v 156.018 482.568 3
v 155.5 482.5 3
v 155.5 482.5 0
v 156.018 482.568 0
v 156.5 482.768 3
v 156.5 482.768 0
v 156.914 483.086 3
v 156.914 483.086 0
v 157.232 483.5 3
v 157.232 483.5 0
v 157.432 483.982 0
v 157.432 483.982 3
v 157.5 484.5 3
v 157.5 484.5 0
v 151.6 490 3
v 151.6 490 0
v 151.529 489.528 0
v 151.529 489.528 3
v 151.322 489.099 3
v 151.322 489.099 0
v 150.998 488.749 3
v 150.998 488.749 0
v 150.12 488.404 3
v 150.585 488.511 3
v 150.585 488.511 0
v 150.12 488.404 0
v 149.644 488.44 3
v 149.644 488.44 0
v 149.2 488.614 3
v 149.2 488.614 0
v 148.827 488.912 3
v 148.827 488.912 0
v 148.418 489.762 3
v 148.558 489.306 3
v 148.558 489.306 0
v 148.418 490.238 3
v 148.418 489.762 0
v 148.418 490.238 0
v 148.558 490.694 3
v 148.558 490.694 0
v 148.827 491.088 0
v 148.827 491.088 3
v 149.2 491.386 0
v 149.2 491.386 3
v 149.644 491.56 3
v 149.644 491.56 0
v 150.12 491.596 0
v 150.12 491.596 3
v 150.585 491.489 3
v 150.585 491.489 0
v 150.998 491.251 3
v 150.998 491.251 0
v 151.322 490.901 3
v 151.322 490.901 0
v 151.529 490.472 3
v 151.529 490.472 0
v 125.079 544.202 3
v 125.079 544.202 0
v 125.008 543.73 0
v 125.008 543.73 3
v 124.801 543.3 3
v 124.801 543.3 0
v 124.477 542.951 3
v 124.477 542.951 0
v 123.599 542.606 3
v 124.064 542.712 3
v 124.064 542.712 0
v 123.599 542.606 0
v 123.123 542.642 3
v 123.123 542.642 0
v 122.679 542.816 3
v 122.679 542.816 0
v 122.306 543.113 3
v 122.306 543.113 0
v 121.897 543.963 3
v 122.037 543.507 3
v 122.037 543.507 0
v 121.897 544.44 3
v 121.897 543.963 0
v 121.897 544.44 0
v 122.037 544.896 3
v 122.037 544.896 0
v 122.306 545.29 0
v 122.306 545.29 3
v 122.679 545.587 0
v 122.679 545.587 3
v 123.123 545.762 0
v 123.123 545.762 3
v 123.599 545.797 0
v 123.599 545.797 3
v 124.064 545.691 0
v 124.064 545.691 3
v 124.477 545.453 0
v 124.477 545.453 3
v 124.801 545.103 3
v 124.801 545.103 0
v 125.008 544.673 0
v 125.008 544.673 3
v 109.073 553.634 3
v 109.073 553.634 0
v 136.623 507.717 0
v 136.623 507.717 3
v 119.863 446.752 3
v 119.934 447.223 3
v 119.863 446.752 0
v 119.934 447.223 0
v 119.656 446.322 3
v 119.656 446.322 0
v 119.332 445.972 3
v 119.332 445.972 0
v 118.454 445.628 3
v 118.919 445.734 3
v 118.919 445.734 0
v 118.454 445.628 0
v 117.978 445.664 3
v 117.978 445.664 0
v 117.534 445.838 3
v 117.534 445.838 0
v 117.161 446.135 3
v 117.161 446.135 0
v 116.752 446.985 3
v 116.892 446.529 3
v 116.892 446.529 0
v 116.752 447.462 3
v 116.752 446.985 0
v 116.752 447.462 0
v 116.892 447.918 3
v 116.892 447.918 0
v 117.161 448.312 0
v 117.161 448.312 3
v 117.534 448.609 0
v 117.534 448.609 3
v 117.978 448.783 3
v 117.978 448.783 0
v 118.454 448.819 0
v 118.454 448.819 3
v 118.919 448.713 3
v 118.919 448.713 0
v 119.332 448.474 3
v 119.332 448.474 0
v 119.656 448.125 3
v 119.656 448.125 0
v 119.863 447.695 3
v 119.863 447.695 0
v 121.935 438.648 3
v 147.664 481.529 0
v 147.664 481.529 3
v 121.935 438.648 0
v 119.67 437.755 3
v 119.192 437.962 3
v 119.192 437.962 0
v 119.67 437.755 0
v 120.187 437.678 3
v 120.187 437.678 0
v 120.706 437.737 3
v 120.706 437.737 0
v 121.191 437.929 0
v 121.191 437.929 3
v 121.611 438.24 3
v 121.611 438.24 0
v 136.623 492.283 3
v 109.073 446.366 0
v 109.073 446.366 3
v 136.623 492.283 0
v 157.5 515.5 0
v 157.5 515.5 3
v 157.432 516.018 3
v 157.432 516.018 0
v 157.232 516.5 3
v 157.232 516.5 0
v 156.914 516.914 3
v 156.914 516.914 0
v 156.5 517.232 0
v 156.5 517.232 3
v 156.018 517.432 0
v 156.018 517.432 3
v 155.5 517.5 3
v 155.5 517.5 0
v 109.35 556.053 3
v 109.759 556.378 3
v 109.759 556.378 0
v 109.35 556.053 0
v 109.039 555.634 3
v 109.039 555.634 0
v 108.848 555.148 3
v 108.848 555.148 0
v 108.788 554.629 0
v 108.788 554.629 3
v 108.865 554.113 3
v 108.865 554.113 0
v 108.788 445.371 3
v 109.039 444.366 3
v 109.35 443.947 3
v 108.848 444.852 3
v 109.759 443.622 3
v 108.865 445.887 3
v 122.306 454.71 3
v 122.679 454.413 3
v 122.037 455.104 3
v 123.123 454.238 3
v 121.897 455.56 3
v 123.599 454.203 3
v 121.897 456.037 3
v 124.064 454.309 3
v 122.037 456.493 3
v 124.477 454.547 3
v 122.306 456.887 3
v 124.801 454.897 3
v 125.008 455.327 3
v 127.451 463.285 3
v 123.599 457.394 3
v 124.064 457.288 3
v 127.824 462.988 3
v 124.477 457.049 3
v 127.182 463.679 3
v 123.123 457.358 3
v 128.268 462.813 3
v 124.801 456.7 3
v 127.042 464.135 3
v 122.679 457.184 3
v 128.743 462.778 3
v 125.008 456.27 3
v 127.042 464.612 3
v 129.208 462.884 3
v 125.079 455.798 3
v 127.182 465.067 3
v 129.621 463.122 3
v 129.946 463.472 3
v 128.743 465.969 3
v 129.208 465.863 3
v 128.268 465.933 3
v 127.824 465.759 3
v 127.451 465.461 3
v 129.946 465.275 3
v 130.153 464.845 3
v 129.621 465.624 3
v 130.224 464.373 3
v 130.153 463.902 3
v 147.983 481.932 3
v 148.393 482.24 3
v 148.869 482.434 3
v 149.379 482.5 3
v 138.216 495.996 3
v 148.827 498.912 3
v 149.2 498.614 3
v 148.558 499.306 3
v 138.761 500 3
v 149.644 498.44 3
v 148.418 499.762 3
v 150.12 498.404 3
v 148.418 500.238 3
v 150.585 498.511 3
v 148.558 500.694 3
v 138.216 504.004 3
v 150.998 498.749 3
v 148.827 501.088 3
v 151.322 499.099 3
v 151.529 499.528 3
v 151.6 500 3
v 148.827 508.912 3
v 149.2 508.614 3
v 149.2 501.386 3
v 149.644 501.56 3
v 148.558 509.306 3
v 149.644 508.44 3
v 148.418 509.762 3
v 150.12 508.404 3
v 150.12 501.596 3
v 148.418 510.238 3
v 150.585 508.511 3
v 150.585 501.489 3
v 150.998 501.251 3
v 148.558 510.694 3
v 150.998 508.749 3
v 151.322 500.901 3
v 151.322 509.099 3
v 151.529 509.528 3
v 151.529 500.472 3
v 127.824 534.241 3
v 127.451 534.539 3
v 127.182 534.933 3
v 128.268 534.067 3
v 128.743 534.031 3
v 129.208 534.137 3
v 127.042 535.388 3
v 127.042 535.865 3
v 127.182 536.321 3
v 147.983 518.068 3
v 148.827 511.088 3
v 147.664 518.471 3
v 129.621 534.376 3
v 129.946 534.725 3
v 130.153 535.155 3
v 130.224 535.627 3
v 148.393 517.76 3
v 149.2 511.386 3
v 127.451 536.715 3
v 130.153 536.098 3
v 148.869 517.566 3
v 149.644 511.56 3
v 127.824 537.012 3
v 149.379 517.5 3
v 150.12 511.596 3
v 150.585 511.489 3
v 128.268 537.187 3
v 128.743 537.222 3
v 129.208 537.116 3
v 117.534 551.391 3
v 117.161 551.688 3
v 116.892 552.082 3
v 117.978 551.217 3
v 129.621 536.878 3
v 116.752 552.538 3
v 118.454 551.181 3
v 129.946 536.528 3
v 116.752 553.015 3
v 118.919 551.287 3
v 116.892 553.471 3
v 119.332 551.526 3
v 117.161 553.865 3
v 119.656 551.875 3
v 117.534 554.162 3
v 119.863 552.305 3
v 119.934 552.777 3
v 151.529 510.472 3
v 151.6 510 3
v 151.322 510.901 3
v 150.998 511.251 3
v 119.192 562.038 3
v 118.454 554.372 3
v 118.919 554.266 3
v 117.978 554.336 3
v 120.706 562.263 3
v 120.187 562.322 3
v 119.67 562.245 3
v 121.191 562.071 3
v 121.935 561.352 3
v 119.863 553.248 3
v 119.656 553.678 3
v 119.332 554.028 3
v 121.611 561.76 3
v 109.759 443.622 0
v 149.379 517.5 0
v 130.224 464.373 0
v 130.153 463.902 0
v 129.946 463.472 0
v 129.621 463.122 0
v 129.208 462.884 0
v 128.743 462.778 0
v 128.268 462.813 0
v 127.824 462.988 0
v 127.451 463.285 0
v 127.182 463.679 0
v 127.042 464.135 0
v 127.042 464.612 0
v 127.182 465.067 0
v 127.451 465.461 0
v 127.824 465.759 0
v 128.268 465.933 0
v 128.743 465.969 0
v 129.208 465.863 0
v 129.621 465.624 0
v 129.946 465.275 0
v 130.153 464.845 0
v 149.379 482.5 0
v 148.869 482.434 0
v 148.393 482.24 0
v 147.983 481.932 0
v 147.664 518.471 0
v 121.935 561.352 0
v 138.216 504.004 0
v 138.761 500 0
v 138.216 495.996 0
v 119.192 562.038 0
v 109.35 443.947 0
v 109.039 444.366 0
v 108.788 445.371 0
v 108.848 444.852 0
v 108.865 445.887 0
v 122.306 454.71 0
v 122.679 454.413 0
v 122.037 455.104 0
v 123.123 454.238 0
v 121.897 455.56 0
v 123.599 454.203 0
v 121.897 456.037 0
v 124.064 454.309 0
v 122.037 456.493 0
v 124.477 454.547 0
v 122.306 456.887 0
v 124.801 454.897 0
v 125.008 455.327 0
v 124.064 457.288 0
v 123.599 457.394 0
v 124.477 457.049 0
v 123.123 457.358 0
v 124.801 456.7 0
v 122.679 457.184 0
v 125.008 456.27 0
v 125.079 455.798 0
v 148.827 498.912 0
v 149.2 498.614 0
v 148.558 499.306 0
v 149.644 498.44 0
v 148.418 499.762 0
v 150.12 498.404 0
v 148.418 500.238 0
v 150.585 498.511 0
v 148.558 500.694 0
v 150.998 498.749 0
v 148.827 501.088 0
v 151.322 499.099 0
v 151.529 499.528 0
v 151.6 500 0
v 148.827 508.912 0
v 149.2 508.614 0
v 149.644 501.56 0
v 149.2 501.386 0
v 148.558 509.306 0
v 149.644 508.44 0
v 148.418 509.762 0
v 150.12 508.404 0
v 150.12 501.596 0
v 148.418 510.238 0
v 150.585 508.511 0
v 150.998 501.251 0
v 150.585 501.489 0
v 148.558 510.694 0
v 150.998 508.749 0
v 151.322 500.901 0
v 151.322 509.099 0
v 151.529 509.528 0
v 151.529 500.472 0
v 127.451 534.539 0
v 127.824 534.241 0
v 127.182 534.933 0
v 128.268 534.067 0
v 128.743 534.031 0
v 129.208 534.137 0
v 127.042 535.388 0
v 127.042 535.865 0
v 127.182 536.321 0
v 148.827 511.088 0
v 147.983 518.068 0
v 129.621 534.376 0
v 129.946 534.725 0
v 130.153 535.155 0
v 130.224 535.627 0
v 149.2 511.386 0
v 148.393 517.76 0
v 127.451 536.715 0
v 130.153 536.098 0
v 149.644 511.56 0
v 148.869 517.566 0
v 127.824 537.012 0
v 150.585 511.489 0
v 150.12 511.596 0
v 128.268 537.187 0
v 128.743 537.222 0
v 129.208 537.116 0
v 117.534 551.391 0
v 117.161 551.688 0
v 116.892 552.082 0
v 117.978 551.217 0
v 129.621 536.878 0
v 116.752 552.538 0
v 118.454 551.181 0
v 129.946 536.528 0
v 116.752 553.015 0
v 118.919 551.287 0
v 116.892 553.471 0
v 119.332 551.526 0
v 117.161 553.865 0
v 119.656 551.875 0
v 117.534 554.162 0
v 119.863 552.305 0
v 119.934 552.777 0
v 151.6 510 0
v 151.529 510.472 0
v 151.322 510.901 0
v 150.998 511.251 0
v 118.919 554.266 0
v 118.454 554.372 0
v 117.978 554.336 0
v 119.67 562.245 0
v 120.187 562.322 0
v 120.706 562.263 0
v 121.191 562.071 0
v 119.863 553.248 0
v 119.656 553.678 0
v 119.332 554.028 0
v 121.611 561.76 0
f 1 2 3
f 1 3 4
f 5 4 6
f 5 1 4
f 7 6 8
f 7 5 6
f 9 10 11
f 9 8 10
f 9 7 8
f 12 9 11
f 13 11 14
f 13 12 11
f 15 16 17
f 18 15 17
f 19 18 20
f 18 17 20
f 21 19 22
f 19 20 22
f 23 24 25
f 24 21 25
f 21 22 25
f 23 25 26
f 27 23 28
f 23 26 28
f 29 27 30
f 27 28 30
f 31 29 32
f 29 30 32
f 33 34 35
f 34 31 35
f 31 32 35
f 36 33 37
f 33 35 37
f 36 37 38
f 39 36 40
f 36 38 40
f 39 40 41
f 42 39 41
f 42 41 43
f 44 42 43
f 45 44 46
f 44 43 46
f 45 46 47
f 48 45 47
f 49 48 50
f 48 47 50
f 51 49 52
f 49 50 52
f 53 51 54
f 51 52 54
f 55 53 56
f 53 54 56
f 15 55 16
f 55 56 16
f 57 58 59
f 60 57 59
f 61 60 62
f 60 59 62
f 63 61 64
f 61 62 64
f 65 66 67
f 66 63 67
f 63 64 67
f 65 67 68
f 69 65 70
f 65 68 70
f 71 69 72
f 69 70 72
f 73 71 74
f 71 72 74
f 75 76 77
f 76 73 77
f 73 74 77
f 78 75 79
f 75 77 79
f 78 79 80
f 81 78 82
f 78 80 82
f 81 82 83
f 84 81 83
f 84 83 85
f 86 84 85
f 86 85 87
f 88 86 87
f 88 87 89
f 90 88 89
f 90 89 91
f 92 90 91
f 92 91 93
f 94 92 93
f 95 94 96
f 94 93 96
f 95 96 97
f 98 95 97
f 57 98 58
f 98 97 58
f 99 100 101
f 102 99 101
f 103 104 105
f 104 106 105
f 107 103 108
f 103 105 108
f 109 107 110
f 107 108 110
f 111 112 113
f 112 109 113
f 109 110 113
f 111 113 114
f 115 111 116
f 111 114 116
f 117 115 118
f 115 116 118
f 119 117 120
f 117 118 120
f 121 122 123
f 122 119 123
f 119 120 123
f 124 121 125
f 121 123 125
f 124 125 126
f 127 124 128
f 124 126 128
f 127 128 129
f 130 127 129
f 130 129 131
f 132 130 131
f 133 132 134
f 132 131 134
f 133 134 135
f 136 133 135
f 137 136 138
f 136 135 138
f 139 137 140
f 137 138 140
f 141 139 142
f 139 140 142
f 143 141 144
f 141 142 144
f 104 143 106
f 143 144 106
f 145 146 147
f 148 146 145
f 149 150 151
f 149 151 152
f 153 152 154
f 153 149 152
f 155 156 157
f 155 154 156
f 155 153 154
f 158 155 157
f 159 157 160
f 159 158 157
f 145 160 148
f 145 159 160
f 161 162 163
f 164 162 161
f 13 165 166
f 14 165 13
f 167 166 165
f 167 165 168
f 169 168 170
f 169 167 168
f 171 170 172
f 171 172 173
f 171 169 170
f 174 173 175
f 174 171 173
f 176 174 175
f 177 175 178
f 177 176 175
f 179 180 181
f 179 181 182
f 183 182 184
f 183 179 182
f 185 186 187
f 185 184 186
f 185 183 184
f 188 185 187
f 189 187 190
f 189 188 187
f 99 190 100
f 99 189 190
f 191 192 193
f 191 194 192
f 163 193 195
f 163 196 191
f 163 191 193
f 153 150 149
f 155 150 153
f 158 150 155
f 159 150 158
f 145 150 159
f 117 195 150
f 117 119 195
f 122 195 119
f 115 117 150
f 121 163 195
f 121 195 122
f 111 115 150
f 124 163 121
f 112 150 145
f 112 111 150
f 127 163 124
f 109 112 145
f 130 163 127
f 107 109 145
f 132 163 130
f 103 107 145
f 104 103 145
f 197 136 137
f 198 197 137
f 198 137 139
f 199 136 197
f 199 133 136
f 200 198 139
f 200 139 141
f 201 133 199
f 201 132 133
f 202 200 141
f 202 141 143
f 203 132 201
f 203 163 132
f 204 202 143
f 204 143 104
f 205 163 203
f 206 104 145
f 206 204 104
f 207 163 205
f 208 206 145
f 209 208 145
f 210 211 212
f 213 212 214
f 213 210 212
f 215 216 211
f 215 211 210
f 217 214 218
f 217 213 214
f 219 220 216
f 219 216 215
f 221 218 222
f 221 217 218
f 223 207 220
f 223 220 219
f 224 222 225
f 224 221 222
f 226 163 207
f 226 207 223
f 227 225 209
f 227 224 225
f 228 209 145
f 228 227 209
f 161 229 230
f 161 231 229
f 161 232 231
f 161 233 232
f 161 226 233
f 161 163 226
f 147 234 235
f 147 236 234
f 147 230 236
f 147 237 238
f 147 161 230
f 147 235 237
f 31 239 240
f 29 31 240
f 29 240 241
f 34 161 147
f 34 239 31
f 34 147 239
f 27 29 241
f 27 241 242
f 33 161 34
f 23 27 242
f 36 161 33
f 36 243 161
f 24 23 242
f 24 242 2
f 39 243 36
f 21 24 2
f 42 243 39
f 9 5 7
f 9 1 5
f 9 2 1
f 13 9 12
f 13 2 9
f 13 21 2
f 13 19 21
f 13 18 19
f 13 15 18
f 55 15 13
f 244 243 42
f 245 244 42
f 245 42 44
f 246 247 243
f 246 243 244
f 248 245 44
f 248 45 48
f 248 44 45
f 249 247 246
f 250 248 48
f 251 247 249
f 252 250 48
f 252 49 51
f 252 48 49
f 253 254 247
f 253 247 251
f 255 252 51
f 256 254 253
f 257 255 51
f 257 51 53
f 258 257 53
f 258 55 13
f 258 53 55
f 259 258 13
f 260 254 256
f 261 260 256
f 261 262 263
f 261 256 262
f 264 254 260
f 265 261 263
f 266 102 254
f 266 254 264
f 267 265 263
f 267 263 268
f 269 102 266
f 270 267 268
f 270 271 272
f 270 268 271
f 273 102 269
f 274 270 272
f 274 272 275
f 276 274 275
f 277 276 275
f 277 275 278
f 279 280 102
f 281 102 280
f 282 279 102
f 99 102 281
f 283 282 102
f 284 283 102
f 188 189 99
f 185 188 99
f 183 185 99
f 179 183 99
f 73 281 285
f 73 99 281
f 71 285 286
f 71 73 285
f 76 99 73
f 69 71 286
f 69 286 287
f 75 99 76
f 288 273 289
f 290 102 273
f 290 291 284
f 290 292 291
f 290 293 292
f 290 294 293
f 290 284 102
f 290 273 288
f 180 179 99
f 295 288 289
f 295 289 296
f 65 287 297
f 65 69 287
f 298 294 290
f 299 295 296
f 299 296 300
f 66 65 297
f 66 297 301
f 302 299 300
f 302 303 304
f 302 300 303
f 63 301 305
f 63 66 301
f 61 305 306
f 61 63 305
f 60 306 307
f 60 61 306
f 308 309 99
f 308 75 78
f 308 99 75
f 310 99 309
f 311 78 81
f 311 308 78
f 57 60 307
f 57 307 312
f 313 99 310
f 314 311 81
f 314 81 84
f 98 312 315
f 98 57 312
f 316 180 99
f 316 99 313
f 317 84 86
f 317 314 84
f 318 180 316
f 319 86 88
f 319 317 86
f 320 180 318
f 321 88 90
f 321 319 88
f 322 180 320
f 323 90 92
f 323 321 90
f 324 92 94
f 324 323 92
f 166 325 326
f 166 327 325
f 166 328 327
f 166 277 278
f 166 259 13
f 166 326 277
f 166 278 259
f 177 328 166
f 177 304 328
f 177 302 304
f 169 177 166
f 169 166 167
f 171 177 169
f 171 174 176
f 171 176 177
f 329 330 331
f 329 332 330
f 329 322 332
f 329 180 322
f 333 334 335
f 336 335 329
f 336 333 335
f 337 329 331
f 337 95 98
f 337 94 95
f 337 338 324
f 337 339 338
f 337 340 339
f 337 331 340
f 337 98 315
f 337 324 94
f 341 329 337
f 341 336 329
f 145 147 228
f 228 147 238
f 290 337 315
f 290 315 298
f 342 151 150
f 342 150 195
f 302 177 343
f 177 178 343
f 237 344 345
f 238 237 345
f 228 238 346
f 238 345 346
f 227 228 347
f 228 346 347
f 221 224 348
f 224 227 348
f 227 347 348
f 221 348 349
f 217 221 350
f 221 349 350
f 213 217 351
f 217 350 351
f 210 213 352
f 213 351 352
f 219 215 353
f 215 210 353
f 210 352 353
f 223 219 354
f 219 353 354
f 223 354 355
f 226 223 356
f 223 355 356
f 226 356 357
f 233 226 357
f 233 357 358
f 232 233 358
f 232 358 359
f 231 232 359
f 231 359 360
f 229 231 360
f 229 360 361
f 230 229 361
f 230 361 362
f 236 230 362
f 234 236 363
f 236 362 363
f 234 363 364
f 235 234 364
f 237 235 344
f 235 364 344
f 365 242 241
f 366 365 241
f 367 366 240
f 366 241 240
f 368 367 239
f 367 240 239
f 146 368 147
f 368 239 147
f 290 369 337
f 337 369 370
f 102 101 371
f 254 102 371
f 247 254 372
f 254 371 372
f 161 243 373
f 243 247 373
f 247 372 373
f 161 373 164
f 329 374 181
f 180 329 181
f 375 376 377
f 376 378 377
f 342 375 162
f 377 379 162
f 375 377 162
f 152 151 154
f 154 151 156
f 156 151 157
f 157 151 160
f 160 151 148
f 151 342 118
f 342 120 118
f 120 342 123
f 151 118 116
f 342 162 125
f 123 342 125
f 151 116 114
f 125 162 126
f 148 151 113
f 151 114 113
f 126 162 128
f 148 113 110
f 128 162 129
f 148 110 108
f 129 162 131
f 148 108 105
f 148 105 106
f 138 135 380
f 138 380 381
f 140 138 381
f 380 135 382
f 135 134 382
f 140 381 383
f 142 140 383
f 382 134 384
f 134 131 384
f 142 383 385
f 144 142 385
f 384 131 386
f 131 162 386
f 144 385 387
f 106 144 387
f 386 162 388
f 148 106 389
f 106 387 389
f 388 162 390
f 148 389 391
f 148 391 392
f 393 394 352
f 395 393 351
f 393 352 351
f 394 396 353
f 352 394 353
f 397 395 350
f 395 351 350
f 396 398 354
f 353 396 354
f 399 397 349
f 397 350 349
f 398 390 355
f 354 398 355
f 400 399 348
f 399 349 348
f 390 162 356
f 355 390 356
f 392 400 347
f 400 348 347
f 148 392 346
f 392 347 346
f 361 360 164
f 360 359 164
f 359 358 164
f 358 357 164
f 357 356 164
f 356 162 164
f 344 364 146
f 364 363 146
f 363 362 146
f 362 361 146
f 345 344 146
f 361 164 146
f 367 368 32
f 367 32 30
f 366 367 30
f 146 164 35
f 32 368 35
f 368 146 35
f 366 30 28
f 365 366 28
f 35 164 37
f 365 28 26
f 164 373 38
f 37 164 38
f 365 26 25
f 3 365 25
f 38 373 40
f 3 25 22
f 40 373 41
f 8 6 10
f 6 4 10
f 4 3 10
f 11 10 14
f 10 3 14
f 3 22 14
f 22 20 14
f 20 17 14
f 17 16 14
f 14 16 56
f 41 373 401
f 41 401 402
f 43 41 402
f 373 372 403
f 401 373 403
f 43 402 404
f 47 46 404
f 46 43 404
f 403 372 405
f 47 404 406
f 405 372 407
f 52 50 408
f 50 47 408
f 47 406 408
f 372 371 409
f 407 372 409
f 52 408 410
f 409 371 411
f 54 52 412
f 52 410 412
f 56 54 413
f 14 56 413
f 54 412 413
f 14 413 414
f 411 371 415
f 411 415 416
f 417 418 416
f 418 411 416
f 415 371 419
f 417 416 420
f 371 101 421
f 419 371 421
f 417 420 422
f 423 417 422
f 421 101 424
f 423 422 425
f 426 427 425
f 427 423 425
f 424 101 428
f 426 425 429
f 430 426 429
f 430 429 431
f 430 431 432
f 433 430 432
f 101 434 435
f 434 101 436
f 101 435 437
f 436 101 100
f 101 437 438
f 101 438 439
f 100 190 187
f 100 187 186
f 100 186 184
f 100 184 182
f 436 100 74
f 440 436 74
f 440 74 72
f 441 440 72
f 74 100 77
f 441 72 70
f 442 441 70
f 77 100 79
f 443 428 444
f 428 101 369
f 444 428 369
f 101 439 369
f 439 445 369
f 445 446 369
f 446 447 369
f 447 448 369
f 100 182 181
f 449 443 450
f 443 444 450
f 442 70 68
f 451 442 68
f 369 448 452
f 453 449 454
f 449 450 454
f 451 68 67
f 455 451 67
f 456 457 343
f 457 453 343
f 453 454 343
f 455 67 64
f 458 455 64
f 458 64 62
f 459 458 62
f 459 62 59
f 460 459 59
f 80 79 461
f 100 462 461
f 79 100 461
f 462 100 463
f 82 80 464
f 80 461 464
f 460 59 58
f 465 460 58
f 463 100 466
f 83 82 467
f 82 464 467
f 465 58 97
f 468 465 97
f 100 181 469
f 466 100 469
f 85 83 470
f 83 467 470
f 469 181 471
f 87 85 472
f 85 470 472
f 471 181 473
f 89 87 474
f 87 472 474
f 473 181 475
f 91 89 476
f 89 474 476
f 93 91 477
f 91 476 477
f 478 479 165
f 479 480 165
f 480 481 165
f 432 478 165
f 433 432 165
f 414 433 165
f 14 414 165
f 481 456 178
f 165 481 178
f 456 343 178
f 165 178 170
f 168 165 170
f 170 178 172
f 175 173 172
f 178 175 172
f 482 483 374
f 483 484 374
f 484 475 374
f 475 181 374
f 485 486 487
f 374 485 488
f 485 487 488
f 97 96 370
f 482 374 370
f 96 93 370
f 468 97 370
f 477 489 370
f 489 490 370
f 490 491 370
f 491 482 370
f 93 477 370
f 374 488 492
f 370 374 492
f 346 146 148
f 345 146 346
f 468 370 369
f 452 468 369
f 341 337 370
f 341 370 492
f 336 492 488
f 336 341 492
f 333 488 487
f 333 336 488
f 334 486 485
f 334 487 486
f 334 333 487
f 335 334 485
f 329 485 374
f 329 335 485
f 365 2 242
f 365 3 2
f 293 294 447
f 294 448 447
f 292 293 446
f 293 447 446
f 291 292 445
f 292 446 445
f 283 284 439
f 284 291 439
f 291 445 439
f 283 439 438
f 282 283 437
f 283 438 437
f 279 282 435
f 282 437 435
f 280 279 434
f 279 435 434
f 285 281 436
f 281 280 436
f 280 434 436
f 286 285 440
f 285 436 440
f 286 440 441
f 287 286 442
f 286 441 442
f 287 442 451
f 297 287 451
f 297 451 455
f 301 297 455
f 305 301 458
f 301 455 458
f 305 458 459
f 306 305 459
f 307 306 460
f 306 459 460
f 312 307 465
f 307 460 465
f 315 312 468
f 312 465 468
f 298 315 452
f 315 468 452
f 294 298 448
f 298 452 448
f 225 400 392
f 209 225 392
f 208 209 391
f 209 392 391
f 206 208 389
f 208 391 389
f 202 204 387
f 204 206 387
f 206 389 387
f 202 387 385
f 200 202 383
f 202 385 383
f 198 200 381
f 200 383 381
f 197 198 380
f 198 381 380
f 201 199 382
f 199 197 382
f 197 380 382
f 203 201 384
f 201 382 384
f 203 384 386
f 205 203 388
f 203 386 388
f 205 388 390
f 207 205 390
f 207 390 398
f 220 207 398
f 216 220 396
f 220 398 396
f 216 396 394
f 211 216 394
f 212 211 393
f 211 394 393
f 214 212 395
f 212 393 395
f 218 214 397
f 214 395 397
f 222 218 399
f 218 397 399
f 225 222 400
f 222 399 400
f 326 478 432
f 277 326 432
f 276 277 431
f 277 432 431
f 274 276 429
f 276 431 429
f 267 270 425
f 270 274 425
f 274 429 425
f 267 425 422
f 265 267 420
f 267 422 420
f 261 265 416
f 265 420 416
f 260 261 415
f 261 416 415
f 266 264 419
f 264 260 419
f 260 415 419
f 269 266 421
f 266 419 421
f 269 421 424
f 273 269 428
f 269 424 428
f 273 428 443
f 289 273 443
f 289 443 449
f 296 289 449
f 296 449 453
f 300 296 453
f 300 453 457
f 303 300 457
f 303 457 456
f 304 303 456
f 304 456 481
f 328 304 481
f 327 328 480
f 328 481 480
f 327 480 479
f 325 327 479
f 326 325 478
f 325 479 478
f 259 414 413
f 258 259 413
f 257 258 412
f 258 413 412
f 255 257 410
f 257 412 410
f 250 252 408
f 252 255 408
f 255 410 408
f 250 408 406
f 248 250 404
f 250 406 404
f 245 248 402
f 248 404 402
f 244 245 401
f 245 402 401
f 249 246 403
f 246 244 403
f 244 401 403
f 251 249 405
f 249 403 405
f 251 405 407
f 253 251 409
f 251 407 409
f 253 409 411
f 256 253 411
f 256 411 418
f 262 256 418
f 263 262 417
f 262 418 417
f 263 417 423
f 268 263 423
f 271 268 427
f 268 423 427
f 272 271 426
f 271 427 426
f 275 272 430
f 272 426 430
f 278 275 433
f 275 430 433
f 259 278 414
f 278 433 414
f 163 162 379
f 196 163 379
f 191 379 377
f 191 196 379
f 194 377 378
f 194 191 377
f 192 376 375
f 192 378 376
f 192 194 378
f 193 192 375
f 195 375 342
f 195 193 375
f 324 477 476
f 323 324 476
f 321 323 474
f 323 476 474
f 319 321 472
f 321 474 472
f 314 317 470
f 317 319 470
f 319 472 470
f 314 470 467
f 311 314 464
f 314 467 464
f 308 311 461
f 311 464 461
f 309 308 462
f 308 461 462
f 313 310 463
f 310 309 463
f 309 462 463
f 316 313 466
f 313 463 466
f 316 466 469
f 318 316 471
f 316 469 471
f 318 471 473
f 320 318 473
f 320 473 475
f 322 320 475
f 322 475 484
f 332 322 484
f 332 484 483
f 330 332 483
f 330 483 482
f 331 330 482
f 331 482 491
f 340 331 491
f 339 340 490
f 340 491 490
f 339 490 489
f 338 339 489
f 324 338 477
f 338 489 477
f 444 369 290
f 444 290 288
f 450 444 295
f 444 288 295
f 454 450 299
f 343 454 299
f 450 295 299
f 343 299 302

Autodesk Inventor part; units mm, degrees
ref_plane "YZ Plane" through (0, 0, 0) normal (1, 0, 0) x (0, 1, 0)
ref_plane "XZ Plane" through (0, 0, 0) normal (0, 1, 0) x (-1, 0, 0)
ref_plane "XY Plane" through (0, 0, 0) normal (0, 0, 1) x (1, 0, 0)
sketch "スケッチ1" plane through (0, 0, 0) normal (0, 0, 1) x (1, 0, 0)
  line L0 (-157.5, 1000) -> (-142.5, 1000)
  line L1 (-142.5, 1000) -> (-142.5, 0)
  line L2 (-142.5, 0) -> (-157.5, 0)
  line L3 (-157.5, 0) -> (-157.5, 1000)
  line L4 (142.5, 500) -> (157.5, 500) construction
  line L5 (157.5, 500) -> (157.5, 0) construction
  line L6 (157.5, 0) -> (142.5, 0)
  line L7 (142.5, 0) -> (142.5, 500) construction
  circle A0 centre (-150, 0) radius 1.6
  circle A1 centre (150, 500) radius 1.6
  line L8 (127.3377, 476.8069) -> (140.2001, 469.0894) construction
  line L9 (140.2001, 469.0894) -> (-127.3377, 23.1931) construction
  line L10 (-127.3377, 23.1931) -> (-140.2001, 30.9106)
  line L11 (-140.2001, 30.9106) -> (127.3377, 476.8069) construction
  line L12 (-150, 0) -> (-133.7689, 27.0518) construction
  circle A2 centre (-150, 1000) radius 1.6
  circle A3 centre (150, 490) radius 1.6
  line L13 (133.7689, 472.9482) -> (150, 500) construction
  line L14 (-133.7689, 27.0518) -> (133.7689, 472.9482) construction
  circle A4 centre (128.6239, 464.3732) radius 1.6
  circle A5 centre (123.479, 455.7983) radius 1.6
  circle A6 centre (118.334, 447.2234) radius 1.6
  circle A7 centre (150, 510) radius 1.6
  circle A8 centre (128.6239, 535.6268) radius 1.6
  circle A9 centre (123.479, 544.2017) radius 1.6
  circle A10 centre (118.334, 552.7766) radius 1.6
  line L15 (157.5, 517.5) -> (157.5, 482.5)
  line L16 (157.5, 482.5) -> (148.2464, 482.5)
  line L17 (157.5, 517.5) -> (148.2464, 517.5)
  line L18 (148.2464, 517.5) -> (120.9065, 563.0665)
  line L19 (120.9065, 563.0665) -> (108.0441, 555.3491)
  line L20 (108.0441, 555.3491) -> (136.6231, 507.7174)
  line L21 (148.2464, 482.5) -> (120.9065, 436.9335)
  line L22 (120.9065, 436.9335) -> (108.0441, 444.6509)
  line L23 (108.0441, 444.6509) -> (136.6231, 492.2826)
  arc A11 (136.6231, 492.2826) -> (136.6231, 507.7174) centre (123.7607, 500) ccw
  line L24 (118.334, 552.7766) -> (128.6239, 535.6268) construction
  point P0 (0, 0)
  point P1 (150, 0)
  dimension "d0" = 15
  dimension "d1" = 15
  dimension "d2" = 1000
  dimension "d3" = 500
  dimension "d4" = 3.2
  dimension "d5" = 3.2
  dimension "d6" = 285
  dimension "d7" = 142.5
  dimension "d8" = 15
  dimension "d9" = 7.5
  dimension "d10" = 520
  dimension "d11" = 3.2
  dimension "d12" = 3.2
  dimension "d13" = 10
  dimension "d14" = 3.2
  dimension "d15" = 3.2
  dimension "d16" = 3.2
  dimension "d17" = 10
  dimension "d18" = 10
  dimension "d19" = 10
  dimension "d20" = 3.2
  dimension "d21" = 10
  dimension "d22" = 7.5
  dimension "d23" = 7.5
  dimension "d24" = 7.5
  dimension "d25" = 7.5
  dimension "d26" = 7.5
  dimension "d27" = 7.5
  dimension "d28" = 7.5
  dimension "d30" = 7.5
  dimension "d31" = 7.5
  dimension "d32" = 15
extrude "押し出し1" add sketch "スケッチ1" along normal blind 3 contours L15 L16 L21 L22 L23 A11 L20 L19 L18 L17
fillet "フィレット1" radius 2 8 edges at (120.9065, 563.0665, 1.5) (157.5, 517.5, 1.5) (157.5, 482.5, 1.5) (120.9065, 436.9335, 1.5) (108.0441, 444.6509, 1.5) (148.2464, 482.5, 1.5) (148.2464, 517.5, 1.5) (108.0441, 555.3491, 1.5)
equation "\"d7\" = 0.5 * d6"
properties part number "プレート保持_固定具2" material "アルミニウム 6061"
